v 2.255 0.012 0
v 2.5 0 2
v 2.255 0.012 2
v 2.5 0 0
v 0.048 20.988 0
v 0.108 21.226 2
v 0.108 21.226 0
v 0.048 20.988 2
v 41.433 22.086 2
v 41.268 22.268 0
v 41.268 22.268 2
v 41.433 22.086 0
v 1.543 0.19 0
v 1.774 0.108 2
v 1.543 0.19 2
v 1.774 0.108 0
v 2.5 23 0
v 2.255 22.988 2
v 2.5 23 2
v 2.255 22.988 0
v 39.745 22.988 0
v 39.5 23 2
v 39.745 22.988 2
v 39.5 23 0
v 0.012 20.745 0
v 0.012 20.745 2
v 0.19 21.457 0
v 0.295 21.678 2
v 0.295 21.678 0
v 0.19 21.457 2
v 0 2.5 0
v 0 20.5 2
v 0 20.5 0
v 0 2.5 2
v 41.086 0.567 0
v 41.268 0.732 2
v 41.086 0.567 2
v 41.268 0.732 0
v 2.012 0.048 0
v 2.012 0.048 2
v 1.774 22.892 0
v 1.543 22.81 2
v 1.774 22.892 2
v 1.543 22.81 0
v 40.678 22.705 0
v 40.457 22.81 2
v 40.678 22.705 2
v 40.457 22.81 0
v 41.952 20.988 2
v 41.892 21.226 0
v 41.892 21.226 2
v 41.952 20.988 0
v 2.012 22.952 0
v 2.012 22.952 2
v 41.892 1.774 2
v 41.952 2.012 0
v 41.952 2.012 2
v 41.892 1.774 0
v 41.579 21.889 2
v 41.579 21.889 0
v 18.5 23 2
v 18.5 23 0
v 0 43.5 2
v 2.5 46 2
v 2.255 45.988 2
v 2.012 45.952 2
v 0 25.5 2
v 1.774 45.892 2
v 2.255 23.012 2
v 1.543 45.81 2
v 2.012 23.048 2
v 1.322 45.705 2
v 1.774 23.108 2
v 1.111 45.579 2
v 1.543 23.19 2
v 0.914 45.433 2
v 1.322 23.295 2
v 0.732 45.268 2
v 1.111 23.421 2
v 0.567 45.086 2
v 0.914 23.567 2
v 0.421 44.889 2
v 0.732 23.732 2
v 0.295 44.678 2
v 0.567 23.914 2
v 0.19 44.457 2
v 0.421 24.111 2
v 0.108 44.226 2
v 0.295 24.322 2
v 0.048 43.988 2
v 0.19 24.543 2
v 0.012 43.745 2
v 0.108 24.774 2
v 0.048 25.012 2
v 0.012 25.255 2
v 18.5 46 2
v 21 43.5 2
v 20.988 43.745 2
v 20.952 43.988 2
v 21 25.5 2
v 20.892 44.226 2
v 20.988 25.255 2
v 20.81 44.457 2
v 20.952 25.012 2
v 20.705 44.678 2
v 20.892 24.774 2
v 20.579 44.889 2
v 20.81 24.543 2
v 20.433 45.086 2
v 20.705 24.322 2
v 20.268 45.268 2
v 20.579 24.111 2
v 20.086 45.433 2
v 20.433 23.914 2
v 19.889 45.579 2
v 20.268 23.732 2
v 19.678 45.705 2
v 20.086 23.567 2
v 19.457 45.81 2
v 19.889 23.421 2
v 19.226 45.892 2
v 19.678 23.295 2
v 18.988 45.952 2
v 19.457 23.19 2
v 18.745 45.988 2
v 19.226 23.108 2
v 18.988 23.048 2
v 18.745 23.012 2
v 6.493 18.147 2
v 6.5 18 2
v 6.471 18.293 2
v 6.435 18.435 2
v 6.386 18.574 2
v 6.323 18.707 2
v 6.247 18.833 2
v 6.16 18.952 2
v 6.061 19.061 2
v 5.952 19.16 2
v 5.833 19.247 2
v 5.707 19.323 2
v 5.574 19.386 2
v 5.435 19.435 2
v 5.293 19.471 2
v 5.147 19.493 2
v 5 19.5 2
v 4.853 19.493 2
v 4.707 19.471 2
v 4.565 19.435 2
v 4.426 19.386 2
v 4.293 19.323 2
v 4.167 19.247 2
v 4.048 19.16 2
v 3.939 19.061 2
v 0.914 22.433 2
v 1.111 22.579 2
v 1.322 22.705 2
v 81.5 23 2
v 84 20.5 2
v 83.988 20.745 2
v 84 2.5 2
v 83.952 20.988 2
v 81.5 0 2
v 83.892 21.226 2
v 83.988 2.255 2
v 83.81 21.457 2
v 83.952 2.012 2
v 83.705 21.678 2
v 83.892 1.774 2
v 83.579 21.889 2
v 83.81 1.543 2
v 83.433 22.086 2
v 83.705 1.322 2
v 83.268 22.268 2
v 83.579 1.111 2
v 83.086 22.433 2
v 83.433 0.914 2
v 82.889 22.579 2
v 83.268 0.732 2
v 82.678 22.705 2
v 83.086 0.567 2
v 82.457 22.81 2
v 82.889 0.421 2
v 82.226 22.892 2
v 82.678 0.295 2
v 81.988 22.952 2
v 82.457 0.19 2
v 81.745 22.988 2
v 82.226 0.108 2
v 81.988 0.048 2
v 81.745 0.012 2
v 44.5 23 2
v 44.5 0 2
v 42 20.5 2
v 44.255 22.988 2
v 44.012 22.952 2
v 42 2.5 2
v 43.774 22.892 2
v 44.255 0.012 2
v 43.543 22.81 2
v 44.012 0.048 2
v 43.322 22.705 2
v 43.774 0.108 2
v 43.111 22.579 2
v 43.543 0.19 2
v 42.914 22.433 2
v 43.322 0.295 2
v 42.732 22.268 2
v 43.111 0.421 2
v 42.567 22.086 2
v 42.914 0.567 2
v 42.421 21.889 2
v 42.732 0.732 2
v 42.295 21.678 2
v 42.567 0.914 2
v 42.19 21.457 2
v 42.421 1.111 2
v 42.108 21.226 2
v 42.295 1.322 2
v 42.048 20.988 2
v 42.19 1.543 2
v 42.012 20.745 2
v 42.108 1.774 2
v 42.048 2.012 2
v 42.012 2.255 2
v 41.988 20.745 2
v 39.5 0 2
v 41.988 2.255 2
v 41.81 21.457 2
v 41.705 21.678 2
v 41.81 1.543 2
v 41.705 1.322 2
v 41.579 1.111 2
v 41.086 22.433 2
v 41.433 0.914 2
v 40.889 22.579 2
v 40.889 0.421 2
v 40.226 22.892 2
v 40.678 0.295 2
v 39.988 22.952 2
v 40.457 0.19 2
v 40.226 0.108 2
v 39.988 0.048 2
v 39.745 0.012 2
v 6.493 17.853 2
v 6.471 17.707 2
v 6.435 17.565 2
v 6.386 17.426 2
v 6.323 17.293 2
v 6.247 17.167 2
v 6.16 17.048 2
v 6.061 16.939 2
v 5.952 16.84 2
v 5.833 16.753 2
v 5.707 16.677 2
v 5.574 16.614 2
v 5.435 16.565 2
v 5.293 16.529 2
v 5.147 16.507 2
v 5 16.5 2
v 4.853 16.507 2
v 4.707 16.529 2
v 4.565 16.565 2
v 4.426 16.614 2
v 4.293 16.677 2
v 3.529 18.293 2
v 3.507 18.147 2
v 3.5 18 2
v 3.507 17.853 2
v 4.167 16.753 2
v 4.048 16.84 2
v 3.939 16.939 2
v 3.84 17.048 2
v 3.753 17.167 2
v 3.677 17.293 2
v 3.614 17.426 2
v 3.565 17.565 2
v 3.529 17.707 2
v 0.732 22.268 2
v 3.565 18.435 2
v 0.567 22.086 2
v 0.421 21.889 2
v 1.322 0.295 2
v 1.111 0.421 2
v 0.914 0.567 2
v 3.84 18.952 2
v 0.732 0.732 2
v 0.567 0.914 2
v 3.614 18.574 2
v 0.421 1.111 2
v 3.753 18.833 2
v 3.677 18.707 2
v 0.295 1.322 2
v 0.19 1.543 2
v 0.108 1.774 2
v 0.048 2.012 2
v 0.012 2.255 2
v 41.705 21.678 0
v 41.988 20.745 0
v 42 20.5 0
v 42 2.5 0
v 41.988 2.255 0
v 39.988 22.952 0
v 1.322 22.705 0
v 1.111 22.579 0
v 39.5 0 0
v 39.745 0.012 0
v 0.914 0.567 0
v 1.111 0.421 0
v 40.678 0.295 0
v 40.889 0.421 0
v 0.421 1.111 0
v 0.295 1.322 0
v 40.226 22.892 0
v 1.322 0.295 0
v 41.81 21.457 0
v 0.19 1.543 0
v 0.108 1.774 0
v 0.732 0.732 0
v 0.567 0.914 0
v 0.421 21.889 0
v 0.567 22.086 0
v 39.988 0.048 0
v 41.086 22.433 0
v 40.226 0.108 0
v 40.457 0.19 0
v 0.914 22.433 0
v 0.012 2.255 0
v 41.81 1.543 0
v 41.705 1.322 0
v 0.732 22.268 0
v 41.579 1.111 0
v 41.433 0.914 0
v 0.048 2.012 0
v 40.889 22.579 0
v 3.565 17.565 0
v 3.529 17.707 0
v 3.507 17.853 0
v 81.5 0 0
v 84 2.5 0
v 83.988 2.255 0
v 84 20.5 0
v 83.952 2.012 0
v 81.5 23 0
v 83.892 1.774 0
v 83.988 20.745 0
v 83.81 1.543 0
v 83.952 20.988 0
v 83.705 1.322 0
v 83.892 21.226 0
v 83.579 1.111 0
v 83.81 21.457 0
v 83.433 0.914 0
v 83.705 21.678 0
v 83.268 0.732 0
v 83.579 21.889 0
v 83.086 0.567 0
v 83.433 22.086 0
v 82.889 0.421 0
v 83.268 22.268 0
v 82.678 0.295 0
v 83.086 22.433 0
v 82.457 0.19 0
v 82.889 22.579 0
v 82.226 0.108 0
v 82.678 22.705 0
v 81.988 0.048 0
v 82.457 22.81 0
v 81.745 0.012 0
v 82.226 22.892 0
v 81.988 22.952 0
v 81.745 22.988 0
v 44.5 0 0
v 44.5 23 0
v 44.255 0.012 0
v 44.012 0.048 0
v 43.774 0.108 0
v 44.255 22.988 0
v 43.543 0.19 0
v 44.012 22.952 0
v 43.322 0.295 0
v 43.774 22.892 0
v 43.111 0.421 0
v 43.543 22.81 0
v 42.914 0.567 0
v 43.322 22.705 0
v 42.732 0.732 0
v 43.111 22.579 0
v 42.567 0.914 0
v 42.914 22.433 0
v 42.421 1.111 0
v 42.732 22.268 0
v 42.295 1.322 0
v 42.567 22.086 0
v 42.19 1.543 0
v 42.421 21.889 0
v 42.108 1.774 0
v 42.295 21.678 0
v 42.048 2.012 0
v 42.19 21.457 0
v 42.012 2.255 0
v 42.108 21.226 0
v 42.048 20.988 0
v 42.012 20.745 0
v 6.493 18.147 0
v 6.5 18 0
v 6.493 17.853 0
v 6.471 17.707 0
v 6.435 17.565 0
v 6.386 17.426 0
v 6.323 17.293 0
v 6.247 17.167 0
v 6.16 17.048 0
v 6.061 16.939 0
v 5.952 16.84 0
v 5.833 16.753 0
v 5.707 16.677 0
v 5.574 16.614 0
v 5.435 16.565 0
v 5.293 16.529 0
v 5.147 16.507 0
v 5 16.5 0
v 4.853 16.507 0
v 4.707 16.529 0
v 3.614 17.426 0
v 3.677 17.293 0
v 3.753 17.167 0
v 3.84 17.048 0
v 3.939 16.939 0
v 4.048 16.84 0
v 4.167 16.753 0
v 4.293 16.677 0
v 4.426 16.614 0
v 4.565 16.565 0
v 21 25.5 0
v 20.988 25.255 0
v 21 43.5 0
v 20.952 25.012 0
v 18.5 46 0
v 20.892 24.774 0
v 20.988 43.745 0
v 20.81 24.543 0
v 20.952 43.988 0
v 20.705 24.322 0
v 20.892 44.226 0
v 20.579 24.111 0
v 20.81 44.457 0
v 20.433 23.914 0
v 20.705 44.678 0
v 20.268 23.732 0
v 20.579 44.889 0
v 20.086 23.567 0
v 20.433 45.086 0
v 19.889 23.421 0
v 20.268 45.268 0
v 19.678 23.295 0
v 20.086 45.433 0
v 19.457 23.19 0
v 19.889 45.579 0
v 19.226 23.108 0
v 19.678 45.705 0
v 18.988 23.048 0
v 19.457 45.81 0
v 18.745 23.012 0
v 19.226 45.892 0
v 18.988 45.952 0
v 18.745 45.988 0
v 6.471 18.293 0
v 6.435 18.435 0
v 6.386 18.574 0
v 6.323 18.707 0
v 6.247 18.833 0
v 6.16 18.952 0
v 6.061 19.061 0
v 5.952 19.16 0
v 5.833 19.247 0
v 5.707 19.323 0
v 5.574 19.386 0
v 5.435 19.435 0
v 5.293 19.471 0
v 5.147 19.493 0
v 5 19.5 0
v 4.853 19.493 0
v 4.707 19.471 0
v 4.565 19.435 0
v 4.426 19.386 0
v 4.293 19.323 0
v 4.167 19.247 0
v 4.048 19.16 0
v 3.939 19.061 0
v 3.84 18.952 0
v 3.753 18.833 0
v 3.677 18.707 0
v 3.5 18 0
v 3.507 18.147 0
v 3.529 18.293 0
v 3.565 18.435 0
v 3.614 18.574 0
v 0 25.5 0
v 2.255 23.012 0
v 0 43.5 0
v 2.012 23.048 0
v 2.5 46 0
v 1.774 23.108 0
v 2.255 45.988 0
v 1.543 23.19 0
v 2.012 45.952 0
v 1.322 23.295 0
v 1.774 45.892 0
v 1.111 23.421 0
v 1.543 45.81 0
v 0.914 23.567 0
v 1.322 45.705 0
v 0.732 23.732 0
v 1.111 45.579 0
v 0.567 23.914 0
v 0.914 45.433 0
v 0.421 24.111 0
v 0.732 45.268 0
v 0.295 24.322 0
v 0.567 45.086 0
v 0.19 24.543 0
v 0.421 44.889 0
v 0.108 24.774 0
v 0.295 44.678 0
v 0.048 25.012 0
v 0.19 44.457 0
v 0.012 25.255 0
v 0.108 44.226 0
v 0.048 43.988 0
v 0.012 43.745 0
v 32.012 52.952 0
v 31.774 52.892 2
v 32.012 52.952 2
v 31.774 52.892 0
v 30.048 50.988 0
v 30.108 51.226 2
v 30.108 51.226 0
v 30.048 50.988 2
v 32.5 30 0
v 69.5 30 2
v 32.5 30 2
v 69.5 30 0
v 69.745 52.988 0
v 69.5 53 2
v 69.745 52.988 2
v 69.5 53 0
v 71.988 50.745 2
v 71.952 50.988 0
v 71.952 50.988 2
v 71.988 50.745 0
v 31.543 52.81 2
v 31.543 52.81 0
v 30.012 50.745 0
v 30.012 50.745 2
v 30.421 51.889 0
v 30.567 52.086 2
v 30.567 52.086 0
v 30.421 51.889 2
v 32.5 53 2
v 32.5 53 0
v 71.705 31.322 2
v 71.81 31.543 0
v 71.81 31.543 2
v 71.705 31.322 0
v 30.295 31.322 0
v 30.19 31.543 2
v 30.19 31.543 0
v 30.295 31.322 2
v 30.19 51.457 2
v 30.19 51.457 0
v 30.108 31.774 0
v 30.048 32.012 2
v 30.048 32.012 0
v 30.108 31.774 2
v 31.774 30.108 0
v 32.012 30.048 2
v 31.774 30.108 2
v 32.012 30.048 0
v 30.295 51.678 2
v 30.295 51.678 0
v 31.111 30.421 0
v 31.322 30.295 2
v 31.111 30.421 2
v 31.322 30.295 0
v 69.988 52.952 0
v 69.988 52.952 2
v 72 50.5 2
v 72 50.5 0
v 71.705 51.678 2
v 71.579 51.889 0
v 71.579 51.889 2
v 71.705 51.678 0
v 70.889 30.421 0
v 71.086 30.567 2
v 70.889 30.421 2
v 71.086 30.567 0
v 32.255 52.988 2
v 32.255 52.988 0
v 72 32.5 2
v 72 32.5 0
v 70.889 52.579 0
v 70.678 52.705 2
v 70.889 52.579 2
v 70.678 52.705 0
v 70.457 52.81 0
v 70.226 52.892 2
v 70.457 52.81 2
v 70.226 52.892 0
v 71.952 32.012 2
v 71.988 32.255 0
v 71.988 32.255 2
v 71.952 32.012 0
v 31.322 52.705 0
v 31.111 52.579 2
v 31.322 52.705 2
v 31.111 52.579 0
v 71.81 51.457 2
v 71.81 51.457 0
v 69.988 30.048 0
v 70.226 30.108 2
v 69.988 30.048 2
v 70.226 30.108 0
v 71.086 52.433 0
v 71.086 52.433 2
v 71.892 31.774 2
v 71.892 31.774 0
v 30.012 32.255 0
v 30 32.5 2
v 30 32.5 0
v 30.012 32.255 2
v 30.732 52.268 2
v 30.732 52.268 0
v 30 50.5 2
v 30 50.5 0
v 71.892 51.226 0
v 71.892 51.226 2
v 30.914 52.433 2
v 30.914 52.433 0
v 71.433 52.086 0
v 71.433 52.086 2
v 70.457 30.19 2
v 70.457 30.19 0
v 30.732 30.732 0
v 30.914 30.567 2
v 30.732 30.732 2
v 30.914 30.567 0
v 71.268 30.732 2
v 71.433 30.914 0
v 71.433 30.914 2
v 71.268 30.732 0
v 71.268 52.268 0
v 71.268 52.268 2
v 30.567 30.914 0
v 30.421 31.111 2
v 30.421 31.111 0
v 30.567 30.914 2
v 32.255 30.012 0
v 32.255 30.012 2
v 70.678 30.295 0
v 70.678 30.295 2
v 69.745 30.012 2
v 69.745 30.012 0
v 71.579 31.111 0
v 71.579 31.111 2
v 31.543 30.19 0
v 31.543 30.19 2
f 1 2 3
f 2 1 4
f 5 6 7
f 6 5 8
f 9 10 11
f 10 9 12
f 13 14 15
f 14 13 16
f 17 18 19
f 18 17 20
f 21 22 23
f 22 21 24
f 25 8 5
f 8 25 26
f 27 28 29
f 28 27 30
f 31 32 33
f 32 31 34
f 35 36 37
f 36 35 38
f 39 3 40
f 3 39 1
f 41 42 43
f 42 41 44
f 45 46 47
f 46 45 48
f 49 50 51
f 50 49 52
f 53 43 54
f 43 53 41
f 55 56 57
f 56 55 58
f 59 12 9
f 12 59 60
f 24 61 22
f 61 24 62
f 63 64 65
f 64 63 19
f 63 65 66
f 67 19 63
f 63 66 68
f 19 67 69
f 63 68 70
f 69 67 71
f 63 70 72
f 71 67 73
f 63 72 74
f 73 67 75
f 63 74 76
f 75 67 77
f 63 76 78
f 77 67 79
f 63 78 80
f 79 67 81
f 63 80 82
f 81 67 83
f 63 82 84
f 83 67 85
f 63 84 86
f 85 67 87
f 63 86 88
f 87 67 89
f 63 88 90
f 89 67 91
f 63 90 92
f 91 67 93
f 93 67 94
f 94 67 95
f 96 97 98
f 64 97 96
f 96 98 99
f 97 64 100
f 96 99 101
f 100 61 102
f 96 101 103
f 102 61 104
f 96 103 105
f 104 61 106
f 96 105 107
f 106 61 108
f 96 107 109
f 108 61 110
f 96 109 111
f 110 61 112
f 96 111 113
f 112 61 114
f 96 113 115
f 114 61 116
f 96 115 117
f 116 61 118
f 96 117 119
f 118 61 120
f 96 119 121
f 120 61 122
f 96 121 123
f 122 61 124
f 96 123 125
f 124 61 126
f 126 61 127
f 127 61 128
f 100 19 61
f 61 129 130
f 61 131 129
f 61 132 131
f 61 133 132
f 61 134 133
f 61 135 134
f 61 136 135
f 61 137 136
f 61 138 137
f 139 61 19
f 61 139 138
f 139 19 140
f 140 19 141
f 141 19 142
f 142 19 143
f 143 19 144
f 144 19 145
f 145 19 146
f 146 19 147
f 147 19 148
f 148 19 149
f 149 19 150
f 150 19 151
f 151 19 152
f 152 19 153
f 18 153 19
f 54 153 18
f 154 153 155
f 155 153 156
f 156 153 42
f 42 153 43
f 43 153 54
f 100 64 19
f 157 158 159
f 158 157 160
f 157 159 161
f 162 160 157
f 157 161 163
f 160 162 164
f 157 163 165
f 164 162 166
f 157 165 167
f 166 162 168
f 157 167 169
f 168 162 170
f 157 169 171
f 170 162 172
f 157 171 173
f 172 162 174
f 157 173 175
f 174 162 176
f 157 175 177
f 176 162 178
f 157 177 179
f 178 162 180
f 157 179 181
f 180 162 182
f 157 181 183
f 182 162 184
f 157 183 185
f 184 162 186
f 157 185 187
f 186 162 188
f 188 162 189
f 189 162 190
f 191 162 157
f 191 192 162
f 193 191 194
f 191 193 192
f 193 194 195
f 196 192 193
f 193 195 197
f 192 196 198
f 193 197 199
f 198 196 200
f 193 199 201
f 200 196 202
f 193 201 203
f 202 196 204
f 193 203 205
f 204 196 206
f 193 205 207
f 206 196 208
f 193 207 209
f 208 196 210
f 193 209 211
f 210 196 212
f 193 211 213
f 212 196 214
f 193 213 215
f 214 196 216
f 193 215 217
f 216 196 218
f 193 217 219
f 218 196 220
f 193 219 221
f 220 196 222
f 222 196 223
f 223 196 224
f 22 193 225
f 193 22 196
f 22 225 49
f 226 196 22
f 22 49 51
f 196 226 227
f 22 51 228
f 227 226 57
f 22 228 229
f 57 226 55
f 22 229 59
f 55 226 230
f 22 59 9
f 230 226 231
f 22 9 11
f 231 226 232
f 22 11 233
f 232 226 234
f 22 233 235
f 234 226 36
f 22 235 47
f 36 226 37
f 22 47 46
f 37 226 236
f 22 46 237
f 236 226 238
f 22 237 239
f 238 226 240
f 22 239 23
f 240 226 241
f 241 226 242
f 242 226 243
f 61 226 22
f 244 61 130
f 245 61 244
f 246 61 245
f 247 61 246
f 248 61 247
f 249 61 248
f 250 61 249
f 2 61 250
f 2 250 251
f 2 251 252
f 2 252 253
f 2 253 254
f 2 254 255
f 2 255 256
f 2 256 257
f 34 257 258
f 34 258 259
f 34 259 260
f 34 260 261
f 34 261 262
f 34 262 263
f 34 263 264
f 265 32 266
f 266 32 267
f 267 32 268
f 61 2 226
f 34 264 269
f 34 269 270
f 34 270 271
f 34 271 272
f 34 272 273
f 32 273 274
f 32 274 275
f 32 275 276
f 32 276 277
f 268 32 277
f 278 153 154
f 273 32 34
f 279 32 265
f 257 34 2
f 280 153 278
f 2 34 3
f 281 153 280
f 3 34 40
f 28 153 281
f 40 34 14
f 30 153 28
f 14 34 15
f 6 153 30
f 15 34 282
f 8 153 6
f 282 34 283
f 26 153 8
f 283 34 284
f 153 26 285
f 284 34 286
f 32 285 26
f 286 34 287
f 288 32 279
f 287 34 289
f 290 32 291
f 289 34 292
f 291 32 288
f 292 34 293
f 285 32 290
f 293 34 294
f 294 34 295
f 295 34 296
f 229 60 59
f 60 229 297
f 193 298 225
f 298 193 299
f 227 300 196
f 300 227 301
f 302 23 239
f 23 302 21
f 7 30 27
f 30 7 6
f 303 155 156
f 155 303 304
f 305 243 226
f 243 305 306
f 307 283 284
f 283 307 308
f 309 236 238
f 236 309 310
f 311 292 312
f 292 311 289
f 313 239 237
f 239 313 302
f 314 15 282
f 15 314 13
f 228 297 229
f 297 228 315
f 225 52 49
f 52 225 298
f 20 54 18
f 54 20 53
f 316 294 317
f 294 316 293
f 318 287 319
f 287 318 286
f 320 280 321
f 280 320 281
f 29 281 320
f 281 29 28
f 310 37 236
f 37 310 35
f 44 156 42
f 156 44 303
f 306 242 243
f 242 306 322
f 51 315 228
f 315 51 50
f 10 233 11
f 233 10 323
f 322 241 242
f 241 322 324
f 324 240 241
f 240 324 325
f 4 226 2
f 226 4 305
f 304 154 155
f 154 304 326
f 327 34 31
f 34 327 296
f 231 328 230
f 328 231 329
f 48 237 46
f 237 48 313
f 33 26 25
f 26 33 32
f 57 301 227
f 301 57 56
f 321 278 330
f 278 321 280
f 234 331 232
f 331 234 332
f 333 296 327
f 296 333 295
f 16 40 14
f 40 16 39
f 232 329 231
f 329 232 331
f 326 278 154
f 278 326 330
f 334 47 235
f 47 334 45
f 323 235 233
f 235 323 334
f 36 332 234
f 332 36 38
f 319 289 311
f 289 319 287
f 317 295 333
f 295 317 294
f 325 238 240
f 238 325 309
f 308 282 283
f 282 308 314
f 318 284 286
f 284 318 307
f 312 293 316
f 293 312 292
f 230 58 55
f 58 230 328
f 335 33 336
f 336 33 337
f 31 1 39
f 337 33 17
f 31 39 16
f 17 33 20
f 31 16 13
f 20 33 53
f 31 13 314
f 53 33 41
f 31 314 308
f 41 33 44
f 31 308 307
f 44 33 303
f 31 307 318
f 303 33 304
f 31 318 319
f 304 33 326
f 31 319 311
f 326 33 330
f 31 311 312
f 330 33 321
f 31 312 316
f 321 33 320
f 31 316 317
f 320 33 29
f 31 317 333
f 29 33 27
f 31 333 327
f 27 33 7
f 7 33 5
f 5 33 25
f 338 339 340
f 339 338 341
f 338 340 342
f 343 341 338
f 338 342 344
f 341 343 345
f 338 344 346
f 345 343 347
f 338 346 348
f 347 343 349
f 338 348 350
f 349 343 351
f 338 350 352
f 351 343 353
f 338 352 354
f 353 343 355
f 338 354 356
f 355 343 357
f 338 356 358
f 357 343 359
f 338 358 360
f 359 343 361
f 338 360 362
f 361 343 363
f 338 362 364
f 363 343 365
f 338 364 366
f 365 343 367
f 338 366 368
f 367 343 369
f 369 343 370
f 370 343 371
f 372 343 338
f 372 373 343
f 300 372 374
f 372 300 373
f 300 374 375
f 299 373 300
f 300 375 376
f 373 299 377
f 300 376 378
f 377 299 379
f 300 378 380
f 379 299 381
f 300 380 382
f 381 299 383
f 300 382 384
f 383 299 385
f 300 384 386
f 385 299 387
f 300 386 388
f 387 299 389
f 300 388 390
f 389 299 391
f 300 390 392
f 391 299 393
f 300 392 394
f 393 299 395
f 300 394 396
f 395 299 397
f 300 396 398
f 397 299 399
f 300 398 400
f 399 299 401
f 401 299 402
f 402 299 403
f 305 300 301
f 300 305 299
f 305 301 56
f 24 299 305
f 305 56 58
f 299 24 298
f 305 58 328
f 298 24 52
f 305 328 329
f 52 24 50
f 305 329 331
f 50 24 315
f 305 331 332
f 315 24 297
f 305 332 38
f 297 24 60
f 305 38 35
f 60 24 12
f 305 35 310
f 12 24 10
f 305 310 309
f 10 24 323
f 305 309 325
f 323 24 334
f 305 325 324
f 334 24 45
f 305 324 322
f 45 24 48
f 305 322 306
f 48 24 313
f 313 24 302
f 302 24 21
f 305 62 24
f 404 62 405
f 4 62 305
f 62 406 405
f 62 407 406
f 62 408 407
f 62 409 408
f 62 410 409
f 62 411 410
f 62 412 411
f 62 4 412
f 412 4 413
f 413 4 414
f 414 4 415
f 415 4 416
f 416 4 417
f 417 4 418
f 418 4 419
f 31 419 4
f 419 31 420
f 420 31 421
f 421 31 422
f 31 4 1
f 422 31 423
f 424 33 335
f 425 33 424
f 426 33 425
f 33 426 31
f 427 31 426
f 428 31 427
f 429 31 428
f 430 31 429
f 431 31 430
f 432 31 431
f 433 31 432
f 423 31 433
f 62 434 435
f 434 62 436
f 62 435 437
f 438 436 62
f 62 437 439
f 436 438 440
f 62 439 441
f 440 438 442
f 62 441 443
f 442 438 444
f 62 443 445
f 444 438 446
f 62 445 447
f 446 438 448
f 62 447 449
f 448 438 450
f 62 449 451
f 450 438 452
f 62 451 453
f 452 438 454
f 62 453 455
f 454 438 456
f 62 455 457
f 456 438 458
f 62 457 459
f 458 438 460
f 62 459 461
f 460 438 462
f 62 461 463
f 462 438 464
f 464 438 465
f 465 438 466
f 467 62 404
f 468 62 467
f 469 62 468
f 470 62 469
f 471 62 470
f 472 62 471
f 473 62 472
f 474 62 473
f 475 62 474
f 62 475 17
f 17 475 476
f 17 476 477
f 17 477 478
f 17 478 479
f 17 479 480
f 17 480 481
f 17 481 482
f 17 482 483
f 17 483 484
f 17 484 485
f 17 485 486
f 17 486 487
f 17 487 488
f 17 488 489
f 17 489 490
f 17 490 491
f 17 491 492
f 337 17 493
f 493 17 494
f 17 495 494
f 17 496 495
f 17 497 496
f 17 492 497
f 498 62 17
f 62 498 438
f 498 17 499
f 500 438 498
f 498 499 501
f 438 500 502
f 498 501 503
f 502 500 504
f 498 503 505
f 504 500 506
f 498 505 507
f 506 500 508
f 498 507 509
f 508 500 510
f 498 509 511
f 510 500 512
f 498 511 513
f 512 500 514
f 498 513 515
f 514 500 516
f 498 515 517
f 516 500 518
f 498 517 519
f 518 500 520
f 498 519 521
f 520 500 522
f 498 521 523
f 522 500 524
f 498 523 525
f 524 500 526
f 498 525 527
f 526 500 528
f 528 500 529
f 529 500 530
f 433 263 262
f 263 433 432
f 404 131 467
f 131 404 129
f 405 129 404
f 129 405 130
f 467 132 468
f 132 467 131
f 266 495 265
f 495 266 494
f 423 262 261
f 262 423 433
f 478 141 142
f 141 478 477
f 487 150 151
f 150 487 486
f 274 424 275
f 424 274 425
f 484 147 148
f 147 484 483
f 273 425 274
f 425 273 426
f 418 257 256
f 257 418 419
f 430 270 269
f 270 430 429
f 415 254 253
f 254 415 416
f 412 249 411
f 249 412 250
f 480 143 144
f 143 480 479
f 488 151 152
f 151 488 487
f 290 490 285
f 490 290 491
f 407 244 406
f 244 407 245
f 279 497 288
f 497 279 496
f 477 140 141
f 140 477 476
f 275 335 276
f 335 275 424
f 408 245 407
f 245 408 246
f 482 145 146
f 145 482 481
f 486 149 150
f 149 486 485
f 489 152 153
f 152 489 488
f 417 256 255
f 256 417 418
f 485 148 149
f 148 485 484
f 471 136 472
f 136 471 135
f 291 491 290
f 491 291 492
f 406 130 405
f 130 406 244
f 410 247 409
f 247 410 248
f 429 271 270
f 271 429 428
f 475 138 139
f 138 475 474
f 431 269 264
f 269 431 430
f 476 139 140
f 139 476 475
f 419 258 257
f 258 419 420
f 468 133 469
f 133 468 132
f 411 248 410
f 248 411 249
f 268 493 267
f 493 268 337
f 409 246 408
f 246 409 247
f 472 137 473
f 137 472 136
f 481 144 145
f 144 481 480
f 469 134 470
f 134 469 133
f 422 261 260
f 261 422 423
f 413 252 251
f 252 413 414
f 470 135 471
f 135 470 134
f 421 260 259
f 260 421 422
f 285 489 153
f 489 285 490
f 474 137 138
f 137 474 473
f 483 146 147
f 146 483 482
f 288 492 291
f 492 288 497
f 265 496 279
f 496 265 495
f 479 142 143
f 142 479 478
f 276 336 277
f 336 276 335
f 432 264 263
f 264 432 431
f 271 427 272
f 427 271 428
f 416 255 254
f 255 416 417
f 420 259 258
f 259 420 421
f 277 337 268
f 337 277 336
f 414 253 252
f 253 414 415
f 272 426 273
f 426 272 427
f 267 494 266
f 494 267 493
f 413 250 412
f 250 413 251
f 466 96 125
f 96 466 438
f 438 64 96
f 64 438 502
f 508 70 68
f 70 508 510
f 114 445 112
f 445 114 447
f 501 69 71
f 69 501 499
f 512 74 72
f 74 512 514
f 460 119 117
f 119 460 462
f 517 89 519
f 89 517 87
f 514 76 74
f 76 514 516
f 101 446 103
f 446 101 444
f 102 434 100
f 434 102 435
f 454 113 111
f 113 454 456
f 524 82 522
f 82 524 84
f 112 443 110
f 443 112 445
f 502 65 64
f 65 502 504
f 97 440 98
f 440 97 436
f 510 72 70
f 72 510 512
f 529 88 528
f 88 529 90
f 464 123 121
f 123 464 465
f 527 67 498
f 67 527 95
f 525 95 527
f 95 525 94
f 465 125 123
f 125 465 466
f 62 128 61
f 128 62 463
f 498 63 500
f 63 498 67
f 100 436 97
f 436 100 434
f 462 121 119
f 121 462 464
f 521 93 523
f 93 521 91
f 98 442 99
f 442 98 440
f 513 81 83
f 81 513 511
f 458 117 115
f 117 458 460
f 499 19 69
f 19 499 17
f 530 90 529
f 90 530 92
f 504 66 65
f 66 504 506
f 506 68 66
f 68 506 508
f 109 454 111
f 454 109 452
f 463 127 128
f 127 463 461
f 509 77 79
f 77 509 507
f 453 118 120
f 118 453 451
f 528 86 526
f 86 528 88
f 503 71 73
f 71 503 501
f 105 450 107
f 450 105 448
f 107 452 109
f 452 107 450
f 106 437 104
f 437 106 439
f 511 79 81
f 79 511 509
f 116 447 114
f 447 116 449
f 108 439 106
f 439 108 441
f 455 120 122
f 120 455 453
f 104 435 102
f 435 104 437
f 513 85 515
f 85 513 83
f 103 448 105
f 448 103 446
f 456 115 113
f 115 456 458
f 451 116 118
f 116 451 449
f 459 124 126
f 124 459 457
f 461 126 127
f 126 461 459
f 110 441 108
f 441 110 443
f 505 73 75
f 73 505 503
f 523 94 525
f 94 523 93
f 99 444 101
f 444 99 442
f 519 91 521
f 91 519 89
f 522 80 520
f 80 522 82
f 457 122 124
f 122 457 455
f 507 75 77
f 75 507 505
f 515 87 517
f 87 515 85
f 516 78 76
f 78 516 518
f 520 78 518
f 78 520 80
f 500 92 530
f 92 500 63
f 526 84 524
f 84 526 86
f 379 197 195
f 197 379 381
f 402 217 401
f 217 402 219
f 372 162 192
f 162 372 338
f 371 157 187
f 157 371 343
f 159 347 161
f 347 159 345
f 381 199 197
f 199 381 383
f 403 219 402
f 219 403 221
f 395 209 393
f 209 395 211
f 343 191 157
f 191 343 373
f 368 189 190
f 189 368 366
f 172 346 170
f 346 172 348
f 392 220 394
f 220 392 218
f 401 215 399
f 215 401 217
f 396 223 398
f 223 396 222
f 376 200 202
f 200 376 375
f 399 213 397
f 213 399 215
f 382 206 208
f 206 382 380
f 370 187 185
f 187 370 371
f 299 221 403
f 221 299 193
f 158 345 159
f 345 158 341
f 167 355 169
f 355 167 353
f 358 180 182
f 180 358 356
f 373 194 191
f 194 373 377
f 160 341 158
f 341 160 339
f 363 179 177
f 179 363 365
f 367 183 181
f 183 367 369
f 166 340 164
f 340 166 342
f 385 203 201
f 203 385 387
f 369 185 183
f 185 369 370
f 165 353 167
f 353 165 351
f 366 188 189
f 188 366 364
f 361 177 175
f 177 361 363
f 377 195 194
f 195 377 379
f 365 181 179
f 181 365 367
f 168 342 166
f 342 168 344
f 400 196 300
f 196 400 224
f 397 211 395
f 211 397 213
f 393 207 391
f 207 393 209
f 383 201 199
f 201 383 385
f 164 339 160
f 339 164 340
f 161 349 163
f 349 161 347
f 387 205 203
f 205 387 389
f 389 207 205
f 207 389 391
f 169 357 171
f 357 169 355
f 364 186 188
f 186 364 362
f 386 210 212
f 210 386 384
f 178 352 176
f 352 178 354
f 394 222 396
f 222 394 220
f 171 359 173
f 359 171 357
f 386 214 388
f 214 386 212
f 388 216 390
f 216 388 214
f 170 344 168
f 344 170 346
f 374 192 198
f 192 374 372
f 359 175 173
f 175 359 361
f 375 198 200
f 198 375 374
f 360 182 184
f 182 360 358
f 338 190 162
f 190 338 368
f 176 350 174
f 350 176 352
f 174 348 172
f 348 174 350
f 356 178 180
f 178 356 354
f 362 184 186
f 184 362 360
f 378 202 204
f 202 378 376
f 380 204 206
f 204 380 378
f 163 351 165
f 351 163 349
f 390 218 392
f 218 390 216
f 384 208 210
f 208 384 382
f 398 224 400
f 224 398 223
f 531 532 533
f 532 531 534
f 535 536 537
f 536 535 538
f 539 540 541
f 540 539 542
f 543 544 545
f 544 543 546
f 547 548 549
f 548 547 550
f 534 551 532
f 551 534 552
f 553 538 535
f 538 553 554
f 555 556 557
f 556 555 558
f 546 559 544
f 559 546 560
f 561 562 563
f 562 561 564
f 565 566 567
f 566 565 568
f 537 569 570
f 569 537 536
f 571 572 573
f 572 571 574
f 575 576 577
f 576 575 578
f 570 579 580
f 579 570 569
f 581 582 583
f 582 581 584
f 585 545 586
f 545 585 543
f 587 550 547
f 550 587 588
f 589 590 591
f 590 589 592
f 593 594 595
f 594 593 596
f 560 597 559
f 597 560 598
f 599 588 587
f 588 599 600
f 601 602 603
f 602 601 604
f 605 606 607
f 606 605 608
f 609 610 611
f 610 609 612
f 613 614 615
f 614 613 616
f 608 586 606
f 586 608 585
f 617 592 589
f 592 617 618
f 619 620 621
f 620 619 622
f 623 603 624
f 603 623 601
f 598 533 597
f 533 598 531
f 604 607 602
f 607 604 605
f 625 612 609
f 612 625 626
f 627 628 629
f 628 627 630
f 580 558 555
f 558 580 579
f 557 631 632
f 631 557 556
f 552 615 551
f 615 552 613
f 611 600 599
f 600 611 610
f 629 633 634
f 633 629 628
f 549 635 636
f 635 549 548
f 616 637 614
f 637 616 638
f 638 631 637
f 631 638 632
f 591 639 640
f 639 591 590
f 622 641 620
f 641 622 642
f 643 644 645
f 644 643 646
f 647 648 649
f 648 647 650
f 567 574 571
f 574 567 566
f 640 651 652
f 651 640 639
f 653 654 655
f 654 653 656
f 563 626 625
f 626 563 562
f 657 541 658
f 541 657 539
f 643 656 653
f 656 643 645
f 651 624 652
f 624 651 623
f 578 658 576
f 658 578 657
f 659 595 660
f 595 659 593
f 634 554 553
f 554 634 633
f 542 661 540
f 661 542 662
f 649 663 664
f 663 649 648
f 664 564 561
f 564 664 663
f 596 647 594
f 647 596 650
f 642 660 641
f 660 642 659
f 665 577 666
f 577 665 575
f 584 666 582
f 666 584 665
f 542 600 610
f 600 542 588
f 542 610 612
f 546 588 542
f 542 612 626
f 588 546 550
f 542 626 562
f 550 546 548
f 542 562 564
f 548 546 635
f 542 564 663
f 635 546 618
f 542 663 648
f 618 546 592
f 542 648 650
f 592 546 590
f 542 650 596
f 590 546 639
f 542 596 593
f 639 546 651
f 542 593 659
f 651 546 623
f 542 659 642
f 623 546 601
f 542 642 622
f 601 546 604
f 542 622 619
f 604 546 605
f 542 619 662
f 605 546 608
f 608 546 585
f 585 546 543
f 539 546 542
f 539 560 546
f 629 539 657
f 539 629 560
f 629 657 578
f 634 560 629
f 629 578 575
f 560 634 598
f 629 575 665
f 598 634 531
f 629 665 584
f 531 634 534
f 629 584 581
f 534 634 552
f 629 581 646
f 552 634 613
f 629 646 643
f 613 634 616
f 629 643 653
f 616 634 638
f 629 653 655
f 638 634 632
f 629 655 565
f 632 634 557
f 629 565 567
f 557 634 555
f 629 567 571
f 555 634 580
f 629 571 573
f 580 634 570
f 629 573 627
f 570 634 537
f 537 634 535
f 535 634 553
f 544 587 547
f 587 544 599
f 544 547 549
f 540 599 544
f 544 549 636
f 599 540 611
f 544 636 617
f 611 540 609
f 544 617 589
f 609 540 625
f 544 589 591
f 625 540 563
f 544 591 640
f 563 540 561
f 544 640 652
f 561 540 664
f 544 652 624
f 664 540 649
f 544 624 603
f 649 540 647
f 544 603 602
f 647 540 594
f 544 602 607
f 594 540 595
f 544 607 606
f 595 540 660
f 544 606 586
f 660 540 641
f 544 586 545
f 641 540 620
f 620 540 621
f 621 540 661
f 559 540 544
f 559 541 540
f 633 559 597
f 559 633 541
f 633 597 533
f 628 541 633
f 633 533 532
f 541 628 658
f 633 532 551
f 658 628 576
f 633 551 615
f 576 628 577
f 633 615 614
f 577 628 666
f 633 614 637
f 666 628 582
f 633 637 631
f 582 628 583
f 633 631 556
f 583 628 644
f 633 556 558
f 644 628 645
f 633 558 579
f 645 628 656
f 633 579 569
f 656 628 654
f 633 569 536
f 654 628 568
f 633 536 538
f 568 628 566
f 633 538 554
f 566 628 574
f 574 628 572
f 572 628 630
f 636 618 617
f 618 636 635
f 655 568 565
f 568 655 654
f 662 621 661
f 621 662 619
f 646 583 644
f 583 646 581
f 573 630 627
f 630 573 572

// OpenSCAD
module RcubeMoveOrigin(){
  union(){
    color("DarkOrchid")difference(){
        translate([0, 0, 0])union()translate([2.5, 2.5, 0])hull(){
                cylinder(d=5,h=2,$fn=64);
                translate([37, 0, 0])cylinder(d=5,h=2,$fn=64);
                translate([0, 18, 0])cylinder(d=5,h=2,$fn=64);
                translate([37, 18, 0])cylinder(d=5,h=2,$fn=64);
              }

        translate([0, 0, -0.1])translate([5, -5, 0])translate([0, 23, 0])cylinder(d=3,h=2.2,$fn=64);
      }

    translate([0, 0, 0])translate([0, 23, 0])color("blue")union()translate([2.5, 2.5, 0])hull(){
                cylinder(d=5,h=2,$fn=64);
                translate([16, 0, 0])cylinder(d=5,h=2,$fn=64);
                translate([0, 18, 0])cylinder(d=5,h=2,$fn=64);
                translate([16, 18, 0])cylinder(d=5,h=2,$fn=64);
              }

    translate([0, 0, 0])translate([42, 0, 0])color("purple")union()translate([2.5, 2.5, 0])hull(){
                cylinder(d=5,h=2,$fn=64);
                translate([37, 0, 0])cylinder(d=5,h=2,$fn=64);
                translate([0, 18, 0])cylinder(d=5,h=2,$fn=64);
                translate([37, 18, 0])cylinder(d=5,h=2,$fn=64);
              }

    translate([0, 0, 0])translate([30, 30, 0])color("MediumVioletRed")union()translate([2.5, 2.5, 0])hull(){
                cylinder(d=5,h=2,$fn=64);
                translate([37, 0, 0])cylinder(d=5,h=2,$fn=64);
                translate([0, 18, 0])cylinder(d=5,h=2,$fn=64);
                translate([37, 18, 0])cylinder(d=5,h=2,$fn=64);
              }

  }
}
$fn=64;
RcubeMoveOrigin();
